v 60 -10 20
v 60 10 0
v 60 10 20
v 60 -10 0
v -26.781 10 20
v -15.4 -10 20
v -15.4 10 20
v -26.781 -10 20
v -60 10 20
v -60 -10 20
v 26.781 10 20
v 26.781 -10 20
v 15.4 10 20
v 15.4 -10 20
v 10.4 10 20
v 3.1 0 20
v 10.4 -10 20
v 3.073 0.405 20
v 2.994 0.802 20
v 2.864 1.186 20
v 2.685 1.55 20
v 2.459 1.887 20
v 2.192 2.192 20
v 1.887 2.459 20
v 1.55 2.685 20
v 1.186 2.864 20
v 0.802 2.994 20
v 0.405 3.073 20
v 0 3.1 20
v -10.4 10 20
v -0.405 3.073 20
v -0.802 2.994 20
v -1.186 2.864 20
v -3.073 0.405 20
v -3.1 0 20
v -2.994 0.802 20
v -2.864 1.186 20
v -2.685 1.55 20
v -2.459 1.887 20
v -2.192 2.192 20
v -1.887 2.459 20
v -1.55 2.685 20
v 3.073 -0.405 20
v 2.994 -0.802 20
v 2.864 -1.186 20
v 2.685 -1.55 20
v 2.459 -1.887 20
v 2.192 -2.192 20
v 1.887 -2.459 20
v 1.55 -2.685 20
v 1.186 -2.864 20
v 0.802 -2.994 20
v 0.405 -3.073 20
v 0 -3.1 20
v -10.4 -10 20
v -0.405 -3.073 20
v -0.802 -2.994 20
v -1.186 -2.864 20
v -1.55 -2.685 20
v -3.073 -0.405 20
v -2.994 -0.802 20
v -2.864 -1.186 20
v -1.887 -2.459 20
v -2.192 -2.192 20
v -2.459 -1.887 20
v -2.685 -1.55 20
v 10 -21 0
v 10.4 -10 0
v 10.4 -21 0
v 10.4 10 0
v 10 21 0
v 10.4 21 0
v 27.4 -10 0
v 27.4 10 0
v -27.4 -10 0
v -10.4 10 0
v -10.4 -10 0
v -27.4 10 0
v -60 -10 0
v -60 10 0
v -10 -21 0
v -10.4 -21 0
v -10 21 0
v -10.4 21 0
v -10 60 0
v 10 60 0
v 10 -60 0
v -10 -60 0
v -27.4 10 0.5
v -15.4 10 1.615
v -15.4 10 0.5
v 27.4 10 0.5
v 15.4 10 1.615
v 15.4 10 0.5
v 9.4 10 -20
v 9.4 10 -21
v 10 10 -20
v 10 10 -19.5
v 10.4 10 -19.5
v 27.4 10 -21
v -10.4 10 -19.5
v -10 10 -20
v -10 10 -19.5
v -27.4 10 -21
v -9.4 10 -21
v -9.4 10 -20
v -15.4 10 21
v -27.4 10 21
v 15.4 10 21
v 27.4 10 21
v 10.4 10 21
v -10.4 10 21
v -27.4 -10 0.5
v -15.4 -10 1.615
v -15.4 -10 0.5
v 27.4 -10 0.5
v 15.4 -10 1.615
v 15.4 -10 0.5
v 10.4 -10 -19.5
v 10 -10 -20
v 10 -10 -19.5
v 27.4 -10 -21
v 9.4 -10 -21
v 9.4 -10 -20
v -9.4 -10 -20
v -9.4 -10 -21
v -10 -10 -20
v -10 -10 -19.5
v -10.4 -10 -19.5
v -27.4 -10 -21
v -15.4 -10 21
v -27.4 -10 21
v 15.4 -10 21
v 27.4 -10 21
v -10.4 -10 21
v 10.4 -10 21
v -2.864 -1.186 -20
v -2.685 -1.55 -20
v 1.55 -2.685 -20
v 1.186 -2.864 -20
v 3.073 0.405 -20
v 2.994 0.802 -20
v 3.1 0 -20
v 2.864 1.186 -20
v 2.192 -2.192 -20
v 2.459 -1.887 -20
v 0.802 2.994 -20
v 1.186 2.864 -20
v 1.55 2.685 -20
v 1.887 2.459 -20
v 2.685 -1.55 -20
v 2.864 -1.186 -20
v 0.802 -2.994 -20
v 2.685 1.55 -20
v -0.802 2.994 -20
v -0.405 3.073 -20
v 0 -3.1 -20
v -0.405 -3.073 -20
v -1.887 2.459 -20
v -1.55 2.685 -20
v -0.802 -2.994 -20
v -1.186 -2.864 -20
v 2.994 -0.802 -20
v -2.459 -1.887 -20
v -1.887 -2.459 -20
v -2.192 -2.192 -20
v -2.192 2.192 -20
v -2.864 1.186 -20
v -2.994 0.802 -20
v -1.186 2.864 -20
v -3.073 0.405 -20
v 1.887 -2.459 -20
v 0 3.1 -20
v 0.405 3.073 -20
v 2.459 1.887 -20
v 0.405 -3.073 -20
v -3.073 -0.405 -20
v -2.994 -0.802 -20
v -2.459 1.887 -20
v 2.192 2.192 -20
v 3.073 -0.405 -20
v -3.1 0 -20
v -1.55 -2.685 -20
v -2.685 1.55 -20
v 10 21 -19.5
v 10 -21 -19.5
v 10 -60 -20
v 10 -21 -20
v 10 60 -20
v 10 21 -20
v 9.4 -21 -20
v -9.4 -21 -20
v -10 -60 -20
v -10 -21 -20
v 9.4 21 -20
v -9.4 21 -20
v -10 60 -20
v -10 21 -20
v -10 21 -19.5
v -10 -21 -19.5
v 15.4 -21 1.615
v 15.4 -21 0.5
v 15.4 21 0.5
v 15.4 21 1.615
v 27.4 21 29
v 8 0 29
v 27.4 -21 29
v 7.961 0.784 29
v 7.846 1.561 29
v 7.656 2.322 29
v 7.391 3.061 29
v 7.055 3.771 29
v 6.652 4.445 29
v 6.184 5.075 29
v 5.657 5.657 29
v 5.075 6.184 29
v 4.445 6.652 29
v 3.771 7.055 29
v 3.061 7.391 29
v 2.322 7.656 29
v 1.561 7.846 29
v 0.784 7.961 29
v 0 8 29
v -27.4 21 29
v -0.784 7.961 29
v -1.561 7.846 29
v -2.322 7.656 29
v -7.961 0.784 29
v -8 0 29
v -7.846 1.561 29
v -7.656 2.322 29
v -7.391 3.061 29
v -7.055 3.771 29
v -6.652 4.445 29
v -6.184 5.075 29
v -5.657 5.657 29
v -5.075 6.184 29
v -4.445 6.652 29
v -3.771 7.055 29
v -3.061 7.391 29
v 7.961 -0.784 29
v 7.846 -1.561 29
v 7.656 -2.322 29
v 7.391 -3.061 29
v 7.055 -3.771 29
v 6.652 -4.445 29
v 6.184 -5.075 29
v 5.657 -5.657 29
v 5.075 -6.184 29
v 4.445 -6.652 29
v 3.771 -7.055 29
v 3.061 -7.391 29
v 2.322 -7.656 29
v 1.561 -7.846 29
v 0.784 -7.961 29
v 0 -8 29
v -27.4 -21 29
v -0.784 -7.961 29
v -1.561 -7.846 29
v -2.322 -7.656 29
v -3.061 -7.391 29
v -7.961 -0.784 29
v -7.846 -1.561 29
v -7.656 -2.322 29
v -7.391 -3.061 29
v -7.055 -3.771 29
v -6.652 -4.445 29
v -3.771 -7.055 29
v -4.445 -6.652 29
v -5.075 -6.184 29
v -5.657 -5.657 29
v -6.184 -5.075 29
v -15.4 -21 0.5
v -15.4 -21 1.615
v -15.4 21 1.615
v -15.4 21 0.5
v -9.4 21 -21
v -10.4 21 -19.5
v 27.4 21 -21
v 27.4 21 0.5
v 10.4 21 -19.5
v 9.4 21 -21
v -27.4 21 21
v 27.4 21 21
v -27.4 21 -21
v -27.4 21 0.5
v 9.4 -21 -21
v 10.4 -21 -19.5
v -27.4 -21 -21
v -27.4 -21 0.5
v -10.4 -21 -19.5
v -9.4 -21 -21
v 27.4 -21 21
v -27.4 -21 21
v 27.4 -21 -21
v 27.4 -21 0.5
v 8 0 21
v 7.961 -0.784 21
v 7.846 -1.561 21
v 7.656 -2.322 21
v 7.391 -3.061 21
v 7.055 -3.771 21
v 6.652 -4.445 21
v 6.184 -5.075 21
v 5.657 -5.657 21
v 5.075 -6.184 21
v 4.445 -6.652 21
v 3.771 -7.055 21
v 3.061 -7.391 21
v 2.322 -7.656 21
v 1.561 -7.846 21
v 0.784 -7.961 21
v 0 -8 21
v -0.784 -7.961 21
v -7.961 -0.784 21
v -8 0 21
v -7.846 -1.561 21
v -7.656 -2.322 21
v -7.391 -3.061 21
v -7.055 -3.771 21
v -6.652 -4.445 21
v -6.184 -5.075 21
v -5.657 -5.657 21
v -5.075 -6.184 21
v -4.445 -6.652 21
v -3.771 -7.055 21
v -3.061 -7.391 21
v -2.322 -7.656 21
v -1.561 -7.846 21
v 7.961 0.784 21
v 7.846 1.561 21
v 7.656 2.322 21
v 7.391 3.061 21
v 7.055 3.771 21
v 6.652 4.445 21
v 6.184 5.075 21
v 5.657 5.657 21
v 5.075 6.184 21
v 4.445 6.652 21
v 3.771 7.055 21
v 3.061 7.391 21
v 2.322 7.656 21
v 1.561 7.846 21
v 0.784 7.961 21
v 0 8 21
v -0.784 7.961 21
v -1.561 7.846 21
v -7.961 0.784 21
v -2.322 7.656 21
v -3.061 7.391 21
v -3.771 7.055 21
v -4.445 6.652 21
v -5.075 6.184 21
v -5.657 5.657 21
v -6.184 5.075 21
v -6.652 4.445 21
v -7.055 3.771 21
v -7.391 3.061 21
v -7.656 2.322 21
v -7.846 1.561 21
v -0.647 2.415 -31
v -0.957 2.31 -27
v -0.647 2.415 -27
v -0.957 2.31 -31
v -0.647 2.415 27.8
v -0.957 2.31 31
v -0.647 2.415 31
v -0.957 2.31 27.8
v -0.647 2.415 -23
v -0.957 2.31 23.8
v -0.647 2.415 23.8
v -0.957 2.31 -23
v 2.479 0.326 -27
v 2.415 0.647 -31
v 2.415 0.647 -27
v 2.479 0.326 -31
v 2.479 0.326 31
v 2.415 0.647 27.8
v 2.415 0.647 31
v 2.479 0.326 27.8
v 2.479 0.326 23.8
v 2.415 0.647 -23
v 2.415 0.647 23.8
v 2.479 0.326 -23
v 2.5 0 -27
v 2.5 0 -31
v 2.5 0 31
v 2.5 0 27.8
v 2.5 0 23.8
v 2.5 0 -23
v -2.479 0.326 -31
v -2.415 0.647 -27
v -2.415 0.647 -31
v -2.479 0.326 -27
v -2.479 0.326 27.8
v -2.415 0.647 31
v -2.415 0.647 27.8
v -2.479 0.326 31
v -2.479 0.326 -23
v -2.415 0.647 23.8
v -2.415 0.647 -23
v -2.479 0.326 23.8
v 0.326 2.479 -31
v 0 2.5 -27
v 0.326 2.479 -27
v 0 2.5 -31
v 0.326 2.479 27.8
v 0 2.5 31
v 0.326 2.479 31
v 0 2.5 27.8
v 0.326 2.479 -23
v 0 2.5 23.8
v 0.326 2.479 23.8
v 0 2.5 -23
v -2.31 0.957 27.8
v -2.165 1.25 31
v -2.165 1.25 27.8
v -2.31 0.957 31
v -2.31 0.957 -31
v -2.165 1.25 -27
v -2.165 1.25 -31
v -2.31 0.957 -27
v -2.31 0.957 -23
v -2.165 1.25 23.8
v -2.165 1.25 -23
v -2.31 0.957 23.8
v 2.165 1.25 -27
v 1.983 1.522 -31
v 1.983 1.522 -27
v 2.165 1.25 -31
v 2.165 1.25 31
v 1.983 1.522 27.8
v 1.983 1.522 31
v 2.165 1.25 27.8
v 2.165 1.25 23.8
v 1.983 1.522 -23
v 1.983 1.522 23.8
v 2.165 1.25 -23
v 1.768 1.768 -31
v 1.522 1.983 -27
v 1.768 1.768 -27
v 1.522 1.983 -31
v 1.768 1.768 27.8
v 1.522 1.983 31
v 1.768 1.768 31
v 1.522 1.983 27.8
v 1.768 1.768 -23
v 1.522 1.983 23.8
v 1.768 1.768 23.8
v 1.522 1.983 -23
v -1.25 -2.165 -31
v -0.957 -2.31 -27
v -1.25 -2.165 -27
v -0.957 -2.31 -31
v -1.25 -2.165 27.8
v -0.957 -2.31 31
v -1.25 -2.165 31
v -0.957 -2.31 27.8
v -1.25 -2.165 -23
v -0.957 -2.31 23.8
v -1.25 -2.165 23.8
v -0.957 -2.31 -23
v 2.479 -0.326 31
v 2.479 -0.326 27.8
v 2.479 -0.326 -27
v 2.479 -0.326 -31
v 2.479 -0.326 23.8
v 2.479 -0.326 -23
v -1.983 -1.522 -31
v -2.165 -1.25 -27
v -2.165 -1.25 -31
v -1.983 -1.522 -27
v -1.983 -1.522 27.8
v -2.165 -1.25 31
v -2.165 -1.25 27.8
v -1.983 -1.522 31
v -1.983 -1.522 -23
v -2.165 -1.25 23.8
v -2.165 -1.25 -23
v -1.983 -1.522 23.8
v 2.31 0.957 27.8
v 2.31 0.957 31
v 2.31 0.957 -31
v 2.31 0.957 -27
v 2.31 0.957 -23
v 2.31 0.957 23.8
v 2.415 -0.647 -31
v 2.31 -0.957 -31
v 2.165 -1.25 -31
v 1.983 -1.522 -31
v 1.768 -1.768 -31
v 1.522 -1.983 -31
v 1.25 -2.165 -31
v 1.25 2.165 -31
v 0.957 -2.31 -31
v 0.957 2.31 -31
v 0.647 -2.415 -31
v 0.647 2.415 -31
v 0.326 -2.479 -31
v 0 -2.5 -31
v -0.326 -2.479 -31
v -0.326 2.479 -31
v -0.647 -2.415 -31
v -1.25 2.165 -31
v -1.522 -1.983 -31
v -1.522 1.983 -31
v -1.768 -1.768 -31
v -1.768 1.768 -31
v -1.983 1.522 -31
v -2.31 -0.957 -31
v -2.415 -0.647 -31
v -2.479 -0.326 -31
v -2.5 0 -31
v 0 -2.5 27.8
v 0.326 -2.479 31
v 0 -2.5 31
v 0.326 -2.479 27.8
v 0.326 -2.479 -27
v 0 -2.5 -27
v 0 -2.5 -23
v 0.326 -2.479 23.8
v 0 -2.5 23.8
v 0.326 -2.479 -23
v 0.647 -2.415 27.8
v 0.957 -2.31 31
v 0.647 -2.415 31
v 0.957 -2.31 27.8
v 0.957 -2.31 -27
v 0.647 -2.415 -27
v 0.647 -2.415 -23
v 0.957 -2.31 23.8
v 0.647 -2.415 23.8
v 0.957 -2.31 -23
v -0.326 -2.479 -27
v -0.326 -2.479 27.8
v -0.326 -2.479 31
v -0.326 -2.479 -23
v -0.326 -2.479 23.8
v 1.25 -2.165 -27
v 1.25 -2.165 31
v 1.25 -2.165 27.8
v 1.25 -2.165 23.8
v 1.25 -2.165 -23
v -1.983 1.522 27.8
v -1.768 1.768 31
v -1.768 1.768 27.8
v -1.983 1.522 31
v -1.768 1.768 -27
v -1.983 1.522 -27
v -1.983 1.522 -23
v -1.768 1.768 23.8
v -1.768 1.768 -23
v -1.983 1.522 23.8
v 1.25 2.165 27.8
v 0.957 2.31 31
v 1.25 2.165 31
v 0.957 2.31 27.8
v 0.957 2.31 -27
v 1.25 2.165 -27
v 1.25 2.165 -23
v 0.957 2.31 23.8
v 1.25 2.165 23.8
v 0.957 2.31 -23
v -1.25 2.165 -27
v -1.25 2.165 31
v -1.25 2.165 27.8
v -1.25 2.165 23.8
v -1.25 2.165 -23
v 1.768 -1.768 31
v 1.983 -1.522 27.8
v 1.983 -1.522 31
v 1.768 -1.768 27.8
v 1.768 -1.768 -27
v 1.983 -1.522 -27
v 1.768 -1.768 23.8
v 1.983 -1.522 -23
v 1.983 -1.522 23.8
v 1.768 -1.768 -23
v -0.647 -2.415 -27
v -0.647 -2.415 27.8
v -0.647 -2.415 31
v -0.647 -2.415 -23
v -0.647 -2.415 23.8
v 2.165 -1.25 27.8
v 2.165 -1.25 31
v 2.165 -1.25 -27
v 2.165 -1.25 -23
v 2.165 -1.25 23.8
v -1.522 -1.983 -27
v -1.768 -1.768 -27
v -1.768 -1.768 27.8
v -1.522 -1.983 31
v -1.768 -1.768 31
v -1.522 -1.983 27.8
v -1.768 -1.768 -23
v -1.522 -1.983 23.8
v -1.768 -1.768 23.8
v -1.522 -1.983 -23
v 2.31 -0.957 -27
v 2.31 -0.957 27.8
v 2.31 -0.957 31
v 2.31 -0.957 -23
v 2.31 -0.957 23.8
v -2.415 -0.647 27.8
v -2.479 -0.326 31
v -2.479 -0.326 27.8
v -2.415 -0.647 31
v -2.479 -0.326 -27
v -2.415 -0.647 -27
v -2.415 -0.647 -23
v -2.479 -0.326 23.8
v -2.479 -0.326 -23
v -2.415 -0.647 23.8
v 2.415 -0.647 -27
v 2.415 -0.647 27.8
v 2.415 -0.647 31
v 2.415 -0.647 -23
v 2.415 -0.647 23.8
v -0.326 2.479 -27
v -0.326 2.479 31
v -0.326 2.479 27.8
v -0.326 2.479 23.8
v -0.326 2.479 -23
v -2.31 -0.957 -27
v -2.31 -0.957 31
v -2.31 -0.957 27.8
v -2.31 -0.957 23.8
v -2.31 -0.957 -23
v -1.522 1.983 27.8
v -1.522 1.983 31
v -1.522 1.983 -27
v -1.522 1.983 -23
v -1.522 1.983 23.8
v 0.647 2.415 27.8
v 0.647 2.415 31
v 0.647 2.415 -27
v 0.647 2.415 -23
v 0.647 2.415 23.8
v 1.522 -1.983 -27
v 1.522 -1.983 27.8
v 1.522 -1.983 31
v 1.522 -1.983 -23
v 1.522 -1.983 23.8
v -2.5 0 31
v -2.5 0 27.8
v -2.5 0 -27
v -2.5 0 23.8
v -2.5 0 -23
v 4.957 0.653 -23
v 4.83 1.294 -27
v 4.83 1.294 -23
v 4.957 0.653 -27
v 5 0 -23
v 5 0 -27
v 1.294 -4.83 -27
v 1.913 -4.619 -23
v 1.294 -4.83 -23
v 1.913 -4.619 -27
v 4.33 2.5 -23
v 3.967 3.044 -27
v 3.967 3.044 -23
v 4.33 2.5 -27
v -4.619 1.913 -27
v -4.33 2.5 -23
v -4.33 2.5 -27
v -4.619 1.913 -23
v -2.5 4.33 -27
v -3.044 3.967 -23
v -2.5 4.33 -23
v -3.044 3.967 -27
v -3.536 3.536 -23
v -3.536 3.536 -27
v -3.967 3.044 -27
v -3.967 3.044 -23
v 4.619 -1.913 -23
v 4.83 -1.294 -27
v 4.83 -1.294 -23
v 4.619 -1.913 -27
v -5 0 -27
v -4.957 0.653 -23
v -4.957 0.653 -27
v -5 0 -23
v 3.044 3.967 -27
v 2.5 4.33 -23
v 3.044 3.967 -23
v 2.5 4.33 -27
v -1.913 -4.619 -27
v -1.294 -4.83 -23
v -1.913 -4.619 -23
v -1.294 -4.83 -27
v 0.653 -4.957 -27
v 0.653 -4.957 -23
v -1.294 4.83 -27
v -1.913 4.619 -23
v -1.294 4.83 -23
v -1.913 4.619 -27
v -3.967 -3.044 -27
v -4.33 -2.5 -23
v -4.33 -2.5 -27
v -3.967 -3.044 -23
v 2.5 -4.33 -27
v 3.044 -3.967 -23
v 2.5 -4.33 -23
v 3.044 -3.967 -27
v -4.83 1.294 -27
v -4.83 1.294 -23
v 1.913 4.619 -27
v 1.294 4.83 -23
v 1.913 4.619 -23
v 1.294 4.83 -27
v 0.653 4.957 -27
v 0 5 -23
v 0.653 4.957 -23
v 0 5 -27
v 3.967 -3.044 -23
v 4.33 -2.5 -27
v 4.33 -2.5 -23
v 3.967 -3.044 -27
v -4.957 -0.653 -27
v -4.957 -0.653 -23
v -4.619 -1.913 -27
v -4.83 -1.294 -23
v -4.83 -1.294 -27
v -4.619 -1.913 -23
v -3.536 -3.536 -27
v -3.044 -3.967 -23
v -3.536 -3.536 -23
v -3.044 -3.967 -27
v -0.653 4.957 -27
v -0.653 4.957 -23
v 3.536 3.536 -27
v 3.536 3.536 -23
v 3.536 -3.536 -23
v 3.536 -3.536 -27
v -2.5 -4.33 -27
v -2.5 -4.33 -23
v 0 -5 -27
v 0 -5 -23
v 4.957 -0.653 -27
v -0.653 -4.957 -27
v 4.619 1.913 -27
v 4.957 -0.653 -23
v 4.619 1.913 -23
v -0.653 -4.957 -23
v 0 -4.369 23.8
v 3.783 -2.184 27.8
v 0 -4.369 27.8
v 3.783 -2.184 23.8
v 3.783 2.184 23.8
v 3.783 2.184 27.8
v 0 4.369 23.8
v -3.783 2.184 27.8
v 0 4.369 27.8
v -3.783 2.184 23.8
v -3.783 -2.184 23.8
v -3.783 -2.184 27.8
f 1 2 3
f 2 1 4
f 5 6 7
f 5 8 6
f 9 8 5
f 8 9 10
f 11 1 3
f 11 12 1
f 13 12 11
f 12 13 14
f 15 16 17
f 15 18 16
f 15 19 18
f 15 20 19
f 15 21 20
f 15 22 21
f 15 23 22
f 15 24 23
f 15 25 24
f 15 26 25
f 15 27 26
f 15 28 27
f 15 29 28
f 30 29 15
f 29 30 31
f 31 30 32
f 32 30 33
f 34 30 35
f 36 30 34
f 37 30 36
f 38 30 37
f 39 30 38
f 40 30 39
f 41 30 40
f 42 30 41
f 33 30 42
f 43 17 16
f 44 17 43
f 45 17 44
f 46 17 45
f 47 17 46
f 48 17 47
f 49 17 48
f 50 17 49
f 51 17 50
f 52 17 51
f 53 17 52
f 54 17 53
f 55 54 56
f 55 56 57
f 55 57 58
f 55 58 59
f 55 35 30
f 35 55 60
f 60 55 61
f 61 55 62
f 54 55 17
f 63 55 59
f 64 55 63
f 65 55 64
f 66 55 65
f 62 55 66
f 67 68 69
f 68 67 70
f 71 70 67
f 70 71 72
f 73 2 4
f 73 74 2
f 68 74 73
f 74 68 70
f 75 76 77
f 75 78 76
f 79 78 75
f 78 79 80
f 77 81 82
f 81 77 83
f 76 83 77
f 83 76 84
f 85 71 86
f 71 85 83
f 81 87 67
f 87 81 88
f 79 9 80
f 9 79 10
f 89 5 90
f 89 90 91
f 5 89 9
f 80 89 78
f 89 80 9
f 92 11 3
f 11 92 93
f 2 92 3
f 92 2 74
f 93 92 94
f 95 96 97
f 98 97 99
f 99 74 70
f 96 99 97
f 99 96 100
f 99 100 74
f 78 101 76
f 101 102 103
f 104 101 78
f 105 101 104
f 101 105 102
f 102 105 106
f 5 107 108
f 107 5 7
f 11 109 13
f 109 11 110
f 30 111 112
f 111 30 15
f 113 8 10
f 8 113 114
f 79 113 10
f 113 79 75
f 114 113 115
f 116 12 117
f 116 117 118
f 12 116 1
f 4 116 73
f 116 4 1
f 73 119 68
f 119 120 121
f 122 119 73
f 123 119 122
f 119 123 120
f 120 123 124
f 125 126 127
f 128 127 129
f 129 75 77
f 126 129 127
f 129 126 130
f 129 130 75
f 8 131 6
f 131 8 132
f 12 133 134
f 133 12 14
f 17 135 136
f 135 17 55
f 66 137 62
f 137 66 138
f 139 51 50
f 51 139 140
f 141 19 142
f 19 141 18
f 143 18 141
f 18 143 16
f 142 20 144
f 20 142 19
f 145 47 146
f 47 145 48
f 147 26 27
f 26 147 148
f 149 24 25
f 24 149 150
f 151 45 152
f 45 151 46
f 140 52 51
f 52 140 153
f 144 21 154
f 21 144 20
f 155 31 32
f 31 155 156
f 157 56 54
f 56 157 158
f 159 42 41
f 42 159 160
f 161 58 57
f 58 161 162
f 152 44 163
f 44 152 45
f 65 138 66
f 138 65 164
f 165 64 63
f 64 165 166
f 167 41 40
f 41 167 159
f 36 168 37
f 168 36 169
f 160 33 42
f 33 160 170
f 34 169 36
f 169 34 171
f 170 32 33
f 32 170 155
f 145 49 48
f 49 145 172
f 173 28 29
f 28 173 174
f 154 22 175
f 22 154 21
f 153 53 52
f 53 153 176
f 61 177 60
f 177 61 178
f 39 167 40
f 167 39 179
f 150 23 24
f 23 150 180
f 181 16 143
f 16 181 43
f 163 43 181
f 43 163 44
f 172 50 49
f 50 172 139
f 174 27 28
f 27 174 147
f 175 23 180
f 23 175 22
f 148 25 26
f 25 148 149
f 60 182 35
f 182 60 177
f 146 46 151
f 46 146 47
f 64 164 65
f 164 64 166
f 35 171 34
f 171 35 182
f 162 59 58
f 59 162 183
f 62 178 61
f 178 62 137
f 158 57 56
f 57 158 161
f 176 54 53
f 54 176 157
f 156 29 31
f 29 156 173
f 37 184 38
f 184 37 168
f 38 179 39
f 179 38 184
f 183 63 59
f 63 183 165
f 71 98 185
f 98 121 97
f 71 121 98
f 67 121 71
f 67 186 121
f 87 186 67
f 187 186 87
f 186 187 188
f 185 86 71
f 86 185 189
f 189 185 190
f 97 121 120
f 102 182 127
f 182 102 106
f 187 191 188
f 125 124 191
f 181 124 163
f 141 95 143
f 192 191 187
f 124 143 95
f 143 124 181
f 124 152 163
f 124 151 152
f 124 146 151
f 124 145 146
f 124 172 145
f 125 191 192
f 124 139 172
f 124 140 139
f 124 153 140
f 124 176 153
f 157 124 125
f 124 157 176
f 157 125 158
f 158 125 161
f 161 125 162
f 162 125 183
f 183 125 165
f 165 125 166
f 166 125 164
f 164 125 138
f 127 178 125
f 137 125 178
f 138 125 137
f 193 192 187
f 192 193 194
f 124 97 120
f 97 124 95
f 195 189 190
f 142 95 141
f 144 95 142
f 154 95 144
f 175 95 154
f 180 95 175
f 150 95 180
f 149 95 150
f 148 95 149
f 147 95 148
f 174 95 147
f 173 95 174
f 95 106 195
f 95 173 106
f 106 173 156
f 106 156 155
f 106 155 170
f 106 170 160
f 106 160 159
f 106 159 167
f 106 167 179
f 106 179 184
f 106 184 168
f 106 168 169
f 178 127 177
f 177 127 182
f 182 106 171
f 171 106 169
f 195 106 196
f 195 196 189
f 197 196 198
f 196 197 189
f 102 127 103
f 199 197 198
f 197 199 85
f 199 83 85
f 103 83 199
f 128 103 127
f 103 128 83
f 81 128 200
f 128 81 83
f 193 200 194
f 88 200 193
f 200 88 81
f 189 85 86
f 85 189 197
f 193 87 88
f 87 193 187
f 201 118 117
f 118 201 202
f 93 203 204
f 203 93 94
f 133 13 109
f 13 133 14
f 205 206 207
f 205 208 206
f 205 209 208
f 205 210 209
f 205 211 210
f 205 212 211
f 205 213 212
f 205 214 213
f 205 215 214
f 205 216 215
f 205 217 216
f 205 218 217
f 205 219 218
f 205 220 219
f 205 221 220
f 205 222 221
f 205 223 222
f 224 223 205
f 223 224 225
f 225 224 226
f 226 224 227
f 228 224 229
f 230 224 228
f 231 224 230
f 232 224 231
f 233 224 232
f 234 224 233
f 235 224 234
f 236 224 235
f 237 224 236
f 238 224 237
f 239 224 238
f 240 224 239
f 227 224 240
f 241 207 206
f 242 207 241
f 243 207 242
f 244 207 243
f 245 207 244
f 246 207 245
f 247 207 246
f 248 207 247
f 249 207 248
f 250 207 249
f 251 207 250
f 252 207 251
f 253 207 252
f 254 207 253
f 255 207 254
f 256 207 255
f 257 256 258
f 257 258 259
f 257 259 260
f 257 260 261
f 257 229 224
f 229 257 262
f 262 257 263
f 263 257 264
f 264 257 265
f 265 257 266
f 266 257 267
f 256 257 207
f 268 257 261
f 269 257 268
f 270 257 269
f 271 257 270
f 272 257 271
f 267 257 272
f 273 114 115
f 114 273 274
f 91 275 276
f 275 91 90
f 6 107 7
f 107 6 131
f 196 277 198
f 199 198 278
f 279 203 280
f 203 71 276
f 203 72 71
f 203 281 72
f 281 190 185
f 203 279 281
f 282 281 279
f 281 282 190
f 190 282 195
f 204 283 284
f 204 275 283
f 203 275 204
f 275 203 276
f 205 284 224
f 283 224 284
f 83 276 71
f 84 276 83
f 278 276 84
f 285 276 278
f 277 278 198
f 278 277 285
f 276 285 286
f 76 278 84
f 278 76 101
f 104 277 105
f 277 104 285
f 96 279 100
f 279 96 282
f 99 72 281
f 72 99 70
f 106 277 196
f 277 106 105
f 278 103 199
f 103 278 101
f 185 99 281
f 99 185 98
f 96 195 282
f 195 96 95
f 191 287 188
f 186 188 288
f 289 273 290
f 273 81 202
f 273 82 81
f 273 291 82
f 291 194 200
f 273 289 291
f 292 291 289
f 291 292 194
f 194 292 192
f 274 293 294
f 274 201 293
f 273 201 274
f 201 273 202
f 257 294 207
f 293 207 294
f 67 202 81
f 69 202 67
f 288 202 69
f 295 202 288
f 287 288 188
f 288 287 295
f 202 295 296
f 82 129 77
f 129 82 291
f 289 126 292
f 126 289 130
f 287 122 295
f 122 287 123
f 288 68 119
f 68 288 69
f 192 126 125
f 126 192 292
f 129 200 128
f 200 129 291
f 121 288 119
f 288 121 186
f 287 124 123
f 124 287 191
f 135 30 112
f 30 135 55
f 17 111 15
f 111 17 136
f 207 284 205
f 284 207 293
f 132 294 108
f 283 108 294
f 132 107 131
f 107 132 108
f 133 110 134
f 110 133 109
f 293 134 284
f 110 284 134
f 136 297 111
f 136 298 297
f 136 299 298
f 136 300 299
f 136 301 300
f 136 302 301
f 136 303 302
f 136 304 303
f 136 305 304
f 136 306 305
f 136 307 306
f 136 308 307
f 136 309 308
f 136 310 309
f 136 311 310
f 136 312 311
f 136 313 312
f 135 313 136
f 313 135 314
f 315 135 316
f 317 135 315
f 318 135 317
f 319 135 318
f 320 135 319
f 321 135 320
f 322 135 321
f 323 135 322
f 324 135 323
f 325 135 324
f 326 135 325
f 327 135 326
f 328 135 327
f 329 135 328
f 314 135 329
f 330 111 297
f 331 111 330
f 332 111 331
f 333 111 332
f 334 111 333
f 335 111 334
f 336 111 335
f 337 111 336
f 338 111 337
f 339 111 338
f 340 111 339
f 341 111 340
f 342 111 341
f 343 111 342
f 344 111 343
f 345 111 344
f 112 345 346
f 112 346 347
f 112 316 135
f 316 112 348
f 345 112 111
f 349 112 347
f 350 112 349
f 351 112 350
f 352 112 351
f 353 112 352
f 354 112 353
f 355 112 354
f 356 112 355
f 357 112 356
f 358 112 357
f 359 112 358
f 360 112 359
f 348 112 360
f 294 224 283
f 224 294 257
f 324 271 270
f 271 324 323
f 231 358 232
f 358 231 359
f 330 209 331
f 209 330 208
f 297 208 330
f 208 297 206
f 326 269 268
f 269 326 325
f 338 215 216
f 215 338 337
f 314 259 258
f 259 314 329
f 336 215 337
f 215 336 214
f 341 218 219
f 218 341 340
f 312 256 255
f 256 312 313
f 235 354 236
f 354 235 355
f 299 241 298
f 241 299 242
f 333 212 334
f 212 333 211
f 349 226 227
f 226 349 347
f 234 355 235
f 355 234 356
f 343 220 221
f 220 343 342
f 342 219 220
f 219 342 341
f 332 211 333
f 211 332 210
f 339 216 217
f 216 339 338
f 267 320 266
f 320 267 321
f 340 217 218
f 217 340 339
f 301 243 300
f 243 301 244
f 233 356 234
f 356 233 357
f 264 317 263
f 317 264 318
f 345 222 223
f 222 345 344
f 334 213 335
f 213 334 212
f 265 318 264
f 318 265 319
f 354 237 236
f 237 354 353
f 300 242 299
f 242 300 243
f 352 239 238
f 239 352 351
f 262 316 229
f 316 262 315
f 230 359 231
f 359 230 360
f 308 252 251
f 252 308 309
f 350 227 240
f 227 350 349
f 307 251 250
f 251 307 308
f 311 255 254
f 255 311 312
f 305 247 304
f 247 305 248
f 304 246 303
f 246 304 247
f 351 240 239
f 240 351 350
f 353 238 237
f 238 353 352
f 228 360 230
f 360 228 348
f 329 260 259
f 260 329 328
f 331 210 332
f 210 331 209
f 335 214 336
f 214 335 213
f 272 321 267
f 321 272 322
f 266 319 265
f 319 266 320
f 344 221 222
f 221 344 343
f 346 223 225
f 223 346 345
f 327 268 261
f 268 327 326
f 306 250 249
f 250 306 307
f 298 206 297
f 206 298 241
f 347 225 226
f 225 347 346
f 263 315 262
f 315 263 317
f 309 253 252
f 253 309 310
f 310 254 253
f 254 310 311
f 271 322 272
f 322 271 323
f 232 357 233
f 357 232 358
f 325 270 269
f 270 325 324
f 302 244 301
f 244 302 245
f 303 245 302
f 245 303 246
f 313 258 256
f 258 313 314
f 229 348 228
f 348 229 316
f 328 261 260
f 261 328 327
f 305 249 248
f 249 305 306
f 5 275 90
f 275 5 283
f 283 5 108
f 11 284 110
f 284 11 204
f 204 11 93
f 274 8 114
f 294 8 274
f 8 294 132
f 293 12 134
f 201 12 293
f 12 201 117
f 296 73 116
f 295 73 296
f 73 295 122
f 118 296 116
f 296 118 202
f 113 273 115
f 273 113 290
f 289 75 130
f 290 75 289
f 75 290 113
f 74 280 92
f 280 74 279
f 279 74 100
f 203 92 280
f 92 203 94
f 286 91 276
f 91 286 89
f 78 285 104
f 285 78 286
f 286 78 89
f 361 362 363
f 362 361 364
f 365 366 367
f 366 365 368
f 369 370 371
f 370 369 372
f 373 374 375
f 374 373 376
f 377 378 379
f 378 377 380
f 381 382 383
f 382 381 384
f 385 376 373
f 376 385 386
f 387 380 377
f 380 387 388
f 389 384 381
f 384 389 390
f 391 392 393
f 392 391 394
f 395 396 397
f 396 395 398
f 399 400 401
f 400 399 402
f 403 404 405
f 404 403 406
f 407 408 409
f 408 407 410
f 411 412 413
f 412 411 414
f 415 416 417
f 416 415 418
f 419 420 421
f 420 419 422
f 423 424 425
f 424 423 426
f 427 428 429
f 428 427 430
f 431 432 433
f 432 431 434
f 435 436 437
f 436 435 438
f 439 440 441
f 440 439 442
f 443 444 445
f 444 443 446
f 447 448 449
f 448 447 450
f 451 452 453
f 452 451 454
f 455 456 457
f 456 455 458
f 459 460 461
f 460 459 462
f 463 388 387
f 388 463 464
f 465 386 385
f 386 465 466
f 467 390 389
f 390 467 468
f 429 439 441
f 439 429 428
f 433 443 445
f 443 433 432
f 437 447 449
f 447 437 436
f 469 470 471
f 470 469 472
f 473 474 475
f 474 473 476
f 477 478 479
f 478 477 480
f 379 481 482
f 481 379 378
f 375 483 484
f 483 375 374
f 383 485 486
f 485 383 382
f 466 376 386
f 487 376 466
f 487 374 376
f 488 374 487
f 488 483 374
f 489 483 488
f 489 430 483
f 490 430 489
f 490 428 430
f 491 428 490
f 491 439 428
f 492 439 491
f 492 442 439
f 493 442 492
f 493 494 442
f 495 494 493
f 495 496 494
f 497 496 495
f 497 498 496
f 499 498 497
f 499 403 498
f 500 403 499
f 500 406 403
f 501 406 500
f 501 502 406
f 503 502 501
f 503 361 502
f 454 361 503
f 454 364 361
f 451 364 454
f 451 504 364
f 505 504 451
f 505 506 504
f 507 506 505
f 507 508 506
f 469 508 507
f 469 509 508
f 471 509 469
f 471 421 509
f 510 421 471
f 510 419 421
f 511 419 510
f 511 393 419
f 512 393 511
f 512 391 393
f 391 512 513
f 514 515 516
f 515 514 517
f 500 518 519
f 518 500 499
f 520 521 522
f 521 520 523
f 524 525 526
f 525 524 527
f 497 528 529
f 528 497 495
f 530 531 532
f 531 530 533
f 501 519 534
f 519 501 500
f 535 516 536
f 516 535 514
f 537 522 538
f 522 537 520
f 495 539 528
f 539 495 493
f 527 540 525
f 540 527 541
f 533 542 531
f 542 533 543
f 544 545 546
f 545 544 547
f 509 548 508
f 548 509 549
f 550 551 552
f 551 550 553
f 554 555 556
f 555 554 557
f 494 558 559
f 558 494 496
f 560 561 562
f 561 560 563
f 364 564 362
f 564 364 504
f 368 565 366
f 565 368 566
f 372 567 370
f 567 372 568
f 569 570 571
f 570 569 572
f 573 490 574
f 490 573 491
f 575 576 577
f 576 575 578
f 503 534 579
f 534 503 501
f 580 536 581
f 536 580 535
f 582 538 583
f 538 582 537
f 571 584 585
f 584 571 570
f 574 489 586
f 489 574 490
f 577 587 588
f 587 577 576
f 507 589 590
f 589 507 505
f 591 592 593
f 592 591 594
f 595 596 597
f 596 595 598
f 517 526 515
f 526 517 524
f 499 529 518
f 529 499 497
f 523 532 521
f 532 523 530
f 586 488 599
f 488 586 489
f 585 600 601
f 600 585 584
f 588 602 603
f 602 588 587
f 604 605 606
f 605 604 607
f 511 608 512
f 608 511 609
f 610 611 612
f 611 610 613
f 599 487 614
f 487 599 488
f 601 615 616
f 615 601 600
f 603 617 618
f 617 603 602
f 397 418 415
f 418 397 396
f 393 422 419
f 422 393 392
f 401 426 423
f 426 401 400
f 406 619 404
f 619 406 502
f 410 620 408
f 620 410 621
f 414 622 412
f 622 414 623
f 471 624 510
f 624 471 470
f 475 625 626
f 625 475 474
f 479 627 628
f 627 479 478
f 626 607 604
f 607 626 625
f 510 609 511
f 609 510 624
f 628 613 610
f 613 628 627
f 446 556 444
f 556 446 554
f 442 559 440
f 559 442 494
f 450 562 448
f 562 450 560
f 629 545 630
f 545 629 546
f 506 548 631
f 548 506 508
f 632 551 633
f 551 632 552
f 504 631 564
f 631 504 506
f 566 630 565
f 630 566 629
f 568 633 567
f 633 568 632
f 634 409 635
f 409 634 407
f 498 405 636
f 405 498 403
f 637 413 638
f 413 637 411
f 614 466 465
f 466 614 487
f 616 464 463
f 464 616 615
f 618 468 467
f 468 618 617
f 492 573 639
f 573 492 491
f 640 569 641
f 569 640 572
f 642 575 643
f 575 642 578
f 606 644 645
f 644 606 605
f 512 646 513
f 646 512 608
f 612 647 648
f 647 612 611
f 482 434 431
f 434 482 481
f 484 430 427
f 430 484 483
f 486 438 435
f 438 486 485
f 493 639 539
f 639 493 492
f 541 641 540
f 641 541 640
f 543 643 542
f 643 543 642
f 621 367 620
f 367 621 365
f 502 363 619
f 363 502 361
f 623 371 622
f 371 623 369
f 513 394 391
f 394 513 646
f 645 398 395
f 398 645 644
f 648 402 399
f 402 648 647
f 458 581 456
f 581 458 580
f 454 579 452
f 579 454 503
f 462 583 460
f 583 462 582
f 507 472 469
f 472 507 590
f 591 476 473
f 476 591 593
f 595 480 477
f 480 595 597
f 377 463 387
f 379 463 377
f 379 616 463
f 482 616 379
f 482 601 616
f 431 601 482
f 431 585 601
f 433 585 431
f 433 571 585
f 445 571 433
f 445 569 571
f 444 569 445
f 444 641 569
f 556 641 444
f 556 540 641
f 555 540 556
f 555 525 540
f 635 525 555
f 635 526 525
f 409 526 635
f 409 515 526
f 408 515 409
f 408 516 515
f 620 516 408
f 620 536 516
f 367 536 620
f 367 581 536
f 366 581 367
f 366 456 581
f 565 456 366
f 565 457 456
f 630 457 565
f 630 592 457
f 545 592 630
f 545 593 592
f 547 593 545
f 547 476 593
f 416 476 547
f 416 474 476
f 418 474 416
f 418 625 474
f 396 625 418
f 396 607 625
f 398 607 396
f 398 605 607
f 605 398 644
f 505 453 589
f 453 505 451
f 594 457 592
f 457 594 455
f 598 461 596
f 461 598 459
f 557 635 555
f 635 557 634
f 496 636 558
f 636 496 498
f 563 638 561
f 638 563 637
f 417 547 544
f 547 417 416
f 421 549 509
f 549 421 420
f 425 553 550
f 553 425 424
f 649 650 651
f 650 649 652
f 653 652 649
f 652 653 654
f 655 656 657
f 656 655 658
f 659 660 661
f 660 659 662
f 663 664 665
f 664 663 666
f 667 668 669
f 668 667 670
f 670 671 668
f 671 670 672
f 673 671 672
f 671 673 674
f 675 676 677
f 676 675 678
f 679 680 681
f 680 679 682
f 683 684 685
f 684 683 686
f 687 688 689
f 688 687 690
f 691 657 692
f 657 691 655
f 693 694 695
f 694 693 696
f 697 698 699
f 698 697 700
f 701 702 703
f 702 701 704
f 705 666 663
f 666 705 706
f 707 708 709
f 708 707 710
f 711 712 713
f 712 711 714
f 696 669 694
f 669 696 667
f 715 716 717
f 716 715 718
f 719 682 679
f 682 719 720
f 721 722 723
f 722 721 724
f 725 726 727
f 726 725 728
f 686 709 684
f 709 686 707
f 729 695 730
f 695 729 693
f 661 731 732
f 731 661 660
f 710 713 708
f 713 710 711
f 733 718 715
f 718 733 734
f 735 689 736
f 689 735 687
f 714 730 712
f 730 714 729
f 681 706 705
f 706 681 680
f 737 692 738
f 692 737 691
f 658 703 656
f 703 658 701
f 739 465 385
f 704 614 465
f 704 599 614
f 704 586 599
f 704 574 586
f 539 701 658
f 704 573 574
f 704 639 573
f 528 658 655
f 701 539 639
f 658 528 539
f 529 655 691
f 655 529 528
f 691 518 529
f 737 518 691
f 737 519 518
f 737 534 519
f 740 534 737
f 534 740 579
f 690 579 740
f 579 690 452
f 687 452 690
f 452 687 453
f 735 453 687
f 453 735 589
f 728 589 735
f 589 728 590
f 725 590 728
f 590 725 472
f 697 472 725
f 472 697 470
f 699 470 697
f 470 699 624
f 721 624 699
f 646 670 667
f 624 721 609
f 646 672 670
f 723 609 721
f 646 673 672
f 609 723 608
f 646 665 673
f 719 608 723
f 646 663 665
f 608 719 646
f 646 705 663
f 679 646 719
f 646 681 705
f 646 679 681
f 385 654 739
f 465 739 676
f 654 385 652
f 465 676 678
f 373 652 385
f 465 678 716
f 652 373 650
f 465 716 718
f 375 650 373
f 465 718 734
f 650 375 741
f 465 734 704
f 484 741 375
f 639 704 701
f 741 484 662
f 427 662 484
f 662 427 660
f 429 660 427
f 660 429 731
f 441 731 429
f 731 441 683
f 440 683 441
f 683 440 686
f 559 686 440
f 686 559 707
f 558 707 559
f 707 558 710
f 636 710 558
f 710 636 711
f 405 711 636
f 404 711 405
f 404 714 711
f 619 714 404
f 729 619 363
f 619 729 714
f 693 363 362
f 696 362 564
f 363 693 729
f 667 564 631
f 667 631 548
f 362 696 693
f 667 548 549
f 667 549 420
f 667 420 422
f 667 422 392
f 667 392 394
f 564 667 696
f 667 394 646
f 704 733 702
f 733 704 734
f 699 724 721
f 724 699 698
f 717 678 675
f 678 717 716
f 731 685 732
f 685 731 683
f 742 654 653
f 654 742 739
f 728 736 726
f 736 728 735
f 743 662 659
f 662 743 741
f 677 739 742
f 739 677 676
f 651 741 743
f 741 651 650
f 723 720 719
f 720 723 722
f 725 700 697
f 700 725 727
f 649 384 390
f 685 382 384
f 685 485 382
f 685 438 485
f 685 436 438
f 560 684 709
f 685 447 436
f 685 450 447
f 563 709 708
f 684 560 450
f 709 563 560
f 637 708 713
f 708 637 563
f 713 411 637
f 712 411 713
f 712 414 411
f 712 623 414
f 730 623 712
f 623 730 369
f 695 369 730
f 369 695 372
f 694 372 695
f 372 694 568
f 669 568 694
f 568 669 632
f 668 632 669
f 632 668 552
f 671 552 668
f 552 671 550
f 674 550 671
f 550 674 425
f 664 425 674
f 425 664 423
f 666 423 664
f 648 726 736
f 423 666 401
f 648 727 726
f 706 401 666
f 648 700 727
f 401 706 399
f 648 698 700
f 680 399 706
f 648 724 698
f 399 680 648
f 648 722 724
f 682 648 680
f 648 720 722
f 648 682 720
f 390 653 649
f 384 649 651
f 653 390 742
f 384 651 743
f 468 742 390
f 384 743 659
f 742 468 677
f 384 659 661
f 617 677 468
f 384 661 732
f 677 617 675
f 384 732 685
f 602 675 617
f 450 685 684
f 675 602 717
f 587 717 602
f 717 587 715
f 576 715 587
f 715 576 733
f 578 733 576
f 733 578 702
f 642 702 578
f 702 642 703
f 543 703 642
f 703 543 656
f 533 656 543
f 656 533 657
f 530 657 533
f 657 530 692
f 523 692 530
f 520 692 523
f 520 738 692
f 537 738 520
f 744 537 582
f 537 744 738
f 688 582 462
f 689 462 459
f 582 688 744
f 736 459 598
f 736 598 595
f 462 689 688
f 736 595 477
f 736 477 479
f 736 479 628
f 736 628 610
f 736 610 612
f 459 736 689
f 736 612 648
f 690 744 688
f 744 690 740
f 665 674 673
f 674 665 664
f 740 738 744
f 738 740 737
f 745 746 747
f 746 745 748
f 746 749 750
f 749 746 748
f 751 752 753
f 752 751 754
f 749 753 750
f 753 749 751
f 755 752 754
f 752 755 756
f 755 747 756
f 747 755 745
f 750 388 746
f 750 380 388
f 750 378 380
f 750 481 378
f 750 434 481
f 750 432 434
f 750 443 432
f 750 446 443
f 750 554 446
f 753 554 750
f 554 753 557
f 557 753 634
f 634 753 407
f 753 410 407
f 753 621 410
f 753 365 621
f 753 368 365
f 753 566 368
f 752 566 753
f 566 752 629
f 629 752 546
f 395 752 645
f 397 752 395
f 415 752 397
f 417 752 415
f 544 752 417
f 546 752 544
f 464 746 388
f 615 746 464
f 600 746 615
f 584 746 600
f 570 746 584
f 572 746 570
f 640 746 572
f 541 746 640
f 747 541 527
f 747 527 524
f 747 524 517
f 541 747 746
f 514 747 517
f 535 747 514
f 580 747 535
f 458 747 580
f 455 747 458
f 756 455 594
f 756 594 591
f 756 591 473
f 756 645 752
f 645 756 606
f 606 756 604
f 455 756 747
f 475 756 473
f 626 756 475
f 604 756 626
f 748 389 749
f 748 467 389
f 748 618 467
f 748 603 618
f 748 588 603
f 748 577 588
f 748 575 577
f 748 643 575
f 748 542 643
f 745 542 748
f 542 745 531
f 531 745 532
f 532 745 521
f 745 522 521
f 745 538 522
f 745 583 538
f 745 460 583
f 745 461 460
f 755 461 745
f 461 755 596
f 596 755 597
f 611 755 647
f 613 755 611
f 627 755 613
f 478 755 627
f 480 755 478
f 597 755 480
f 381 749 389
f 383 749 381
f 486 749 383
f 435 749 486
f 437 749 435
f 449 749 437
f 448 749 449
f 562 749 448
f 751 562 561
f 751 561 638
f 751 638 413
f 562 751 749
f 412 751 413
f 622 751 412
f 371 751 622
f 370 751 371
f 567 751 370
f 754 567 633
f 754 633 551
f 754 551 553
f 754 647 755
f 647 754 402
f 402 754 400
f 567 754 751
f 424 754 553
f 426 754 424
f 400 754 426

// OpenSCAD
// file: ../perpendicular-u-joint-guard-v1.4-full-nut-passage/full_nut_passage_guard.scad
// v1.4: keep the exact v1.3 body; remove the nut-pocket floor with one
// full-depth Ø16 cylindrical subtraction. Units: mm; Z positive upwards.
// Imported v1.3 geometry contains all four triangles and the lower hooks.
use <../perpendicular-u-joint-guard-v1.3-triangular-corner-fills/candidate_triangular_corner_fills.scad>;

$fn = 48;
PART = "clip";
nut_passage_d = 16.0;

module full_depth_nut_passage() {
    // Cutter extends z=-31..39, past the whole printed z=-21..29 envelope.
    // 64 facets match the existing Ø16 pocket, avoiding a stepped profile.
    translate([0, 0, 4])
        cylinder(d = nut_passage_d, h = 70, center = true, $fn = 64);
}

module guard_v1_4() {
    difference() {
        candidate_print_solid();
        full_depth_nut_passage();
    }
}

guard_v1_4();
// file: ../perpendicular-u-joint-guard-v1.3-triangular-corner-fills/candidate_triangular_corner_fills.scad
// Candidate v1.3: four triangular concave-corner fill blocks.
//
// Base: accepted v0.7 eaves12 geometry. v0.9/v1.0/v1.1/v1.2 are not
// imported. Each corner block is a real triangular prism: broad at the roof,
// tapering continuously toward z=0, and overlapping the U side wall.

use <../perpendicular-u-joint-guard-v0.7/perpendicular_double_u_guard.scad>;

$fn = 48;
PART = "candidate_iso";

// Explicit v0.7 interface values.
roof_x_outer = 27.4;       // accepted eaves12 roof: -27.4..+27.4
side_wall_x_outer = 15.4;  // existing side-wall outer edge
blue_tube_x_outer = 10.0;  // blue lower 20x20 tube half-width
plate_y_inner = 10.0;
plate_y_outer = 21.0;
plate_depth_y = plate_y_outer - plate_y_inner; // 11 mm per front/back U plate

// The top edge is 0.5 mm inside the roof volume (roof underside z=21), and
// the lower point enters the side wall by 1 mm in X.  The XZ area therefore
// has positive overlap at both ends, not edge-only contact.
triangle_top_z = 21.5;
triangle_bottom_z = 0.0;
triangle_roof_overlap_z = triangle_top_z - 21.0;
triangle_side_overlap_x = 1.0;
triangle_inner_x = side_wall_x_outer - triangle_side_overlap_x; // 14.4

// Bottom retaining-hook contract copied from v0.7 for explicit verification.
hook_height_z = 1.5;
u_bottom_z = -21.0;
hook_top_z = u_bottom_z + hook_height_z; // -19.5

assert(plate_depth_y == 11, "每个三角块的前后板深必须是 11 mm");
assert(triangle_top_z > 21 && triangle_bottom_z == 0,
       "三角块上端必须搭入屋檐、下端落到 z=0");
assert(triangle_inner_x > blue_tube_x_outer,
       "三角块下端不得进入蓝色方管 x=-10..+10 包络");
assert(triangle_side_overlap_x > 0 && triangle_roof_overlap_z > 0,
       "三角块必须与屋檐和侧墙都有正重叠");
assert(hook_height_z == 1.5 && u_bottom_z == -21 && hook_top_z == -19.5,
       "底部卡脚必须保持 z=-21..-19.5");

// A polygon in XZ is extruded only through the corresponding front/back U
// plate. The center y=-10..+10 passage remains open.
module triangular_fill_xz(points, yc) {
    translate([0, yc, 0])
        rotate([90, 0, 0])
            linear_extrude(height = plate_depth_y,
                           center = true,
                           convexity = 10)
                polygon(points = points);
}

module front_neg_x_triangle() {
    // -X roof end -> +X inward. Top wide, lower point at the side wall.
    triangular_fill_xz([
        [-roof_x_outer, 21.0],
        [-triangle_inner_x, triangle_top_z],
        [-triangle_inner_x, triangle_bottom_z]
    ], (plate_y_inner + plate_y_outer) / 2);
}

module front_pos_x_triangle() {
    // +X roof end -> -X inward. Mirrored triangle.
    triangular_fill_xz([
        [roof_x_outer, 21.0],
        [triangle_inner_x, triangle_top_z],
        [triangle_inner_x, triangle_bottom_z]
    ], (plate_y_inner + plate_y_outer) / 2);
}

module back_neg_x_triangle() {
    triangular_fill_xz([
        [-roof_x_outer, 21.0],
        [-triangle_inner_x, triangle_top_z],
        [-triangle_inner_x, triangle_bottom_z]
    ], -(plate_y_inner + plate_y_outer) / 2);
}

module back_pos_x_triangle() {
    triangular_fill_xz([
        [roof_x_outer, 21.0],
        [triangle_inner_x, triangle_top_z],
        [triangle_inner_x, triangle_bottom_z]
    ], -(plate_y_inner + plate_y_outer) / 2);
}

module front_two_triangular_fills() {
    union() {
        front_neg_x_triangle();
        front_pos_x_triangle();
    }
}

module back_two_triangular_fills() {
    union() {
        back_neg_x_triangle();
        back_pos_x_triangle();
    }
}

module all_four_triangular_fills() {
    union() {
        front_two_triangular_fills();
        back_two_triangular_fills();
    }
}

module candidate_print_solid() {
    // Final hole operation is deliberately after the complete four-block
    // union; this preserves a true Z through-hole and the round nut pocket.
    difference() {
        union() {
            double_u_clip();
            all_four_triangular_fills();
        }
        vertical_screw_relief();
    }
}

module candidate_clip() {
    candidate_print_solid();
}

module candidate_assembly_iso() {
    upper_long_tube();
    lower_cross_tube();
    color([0.96, 0.39, 0.08]) double_u_clip();
    color([0.86, 0.13, 0.08]) front_two_triangular_fills();
    color([0.62, 0.12, 0.52]) back_two_triangular_fills();
    vertical_joint_screw();
}

module candidate_front_xz() {
    lower_cross_tube();
    color([0.96, 0.39, 0.08]) double_u_clip();
    color([0.86, 0.13, 0.08]) front_two_triangular_fills();
    vertical_joint_screw();
}

module candidate_back_xz() {
    lower_cross_tube();
    color([0.96, 0.39, 0.08]) double_u_clip();
    color([0.62, 0.12, 0.52]) back_two_triangular_fills();
    vertical_joint_screw();
}

module candidate_top_slice() {
    // At z=-0.5..2.5 the four blocks show their two front/back 11 mm bands;
    // the blue tube and the central y gap remain visible.
    slice_box = 200;
    color([0.28, 0.45, 0.78])
        intersection() {
            lower_cross_tube();
            translate([-slice_box / 2, -slice_box / 2, -0.5])
                cube([slice_box, slice_box, 3.0]);
        }
    color([0.96, 0.39, 0.08])
        intersection() {
            double_u_clip();
            translate([-slice_box / 2, -slice_box / 2, -0.5])
                cube([slice_box, slice_box, 3.0]);
        }
    color([0.86, 0.13, 0.08])
        intersection() {
            front_two_triangular_fills();
            translate([-slice_box / 2, -slice_box / 2, -0.5])
                cube([slice_box, slice_box, 3.0]);
        }
    color([0.62, 0.12, 0.52])
        intersection() {
            back_two_triangular_fills();
            translate([-slice_box / 2, -slice_box / 2, -0.5])
                cube([slice_box, slice_box, 3.0]);
        }
}

module candidate_hole_section() {
    // Center y=0 section: the bore and round nut pocket are shown without
    // confusing them with the bottom hook, which is outside this section.
    intersection() {
        candidate_print_solid();
        translate([-100, -0.4, -100]) cube([200, 0.8, 200]);
    }
}

module candidate_hook_check() {
    // Isolated lower detail: exact imported v0.7 U plate and blue tube, with
    // hook volumes highlighted only for review. This is not the print union.
    detail_box = 200;
    detail_z0 = -22;
    detail_h = 5;
    detail_y0 = 8;
    detail_ydepth = 15;
    intersection() {
        lower_cross_tube();
        translate([-detail_box / 2, detail_y0, detail_z0])
            cube([detail_box, detail_ydepth, detail_h]);
    }
    color([0.96, 0.39, 0.08])
        intersection() {
            u_plate(plate_y_inner, plate_y_outer);
            translate([-detail_box / 2, detail_y0, detail_z0])
                cube([detail_box, detail_ydepth, detail_h]);
        }
    color([0.20, 0.78, 0.20])
        intersection() {
            union() {
                translate([-13.65, 15.5, -20.25])
                    cube([3.5, 11, 1.5], center = true);
                translate([13.65, 15.5, -20.25])
                    cube([3.5, 11, 1.5], center = true);
            }
            translate([-detail_box / 2, detail_y0, detail_z0])
                cube([detail_box, detail_ydepth, detail_h]);
        }
}

if (PART == "candidate_clip") {
    candidate_clip();
} else if (PART == "candidate_front_xz") {
    candidate_front_xz();
} else if (PART == "candidate_back_xz") {
    candidate_back_xz();
} else if (PART == "candidate_top_slice") {
    candidate_top_slice();
} else if (PART == "candidate_hole_section") {
    candidate_hole_section();
} else if (PART == "candidate_hook_check") {
    candidate_hook_check();
} else {
    candidate_assembly_iso();
}
// file: ../perpendicular-u-joint-guard-v1.5-vertical-tube-clearance/vertical_tube_clearance_guard.scad
// v1.5: v1.4 Ø16 full nut passage + minimum downward-entry upper-tube slot.
// Units mm. X: upper long tube; Y: blue foot/front-back; Z: up.
use <../perpendicular-u-joint-guard-v1.4-full-nut-passage/full_nut_passage_guard.scad>;

$fn = 48;

module upper_pipe_vertical_entry_slot() {
    // Fixed gray upper tube: x=-60..60, y=-10..10, z=0..20.
    // While the clip moves down, that tube sweeps upward in clip coordinates.
    // A bottom-open slot ending at z=20 covers its whole relevant sweep in
    // the printed z=-21..29 envelope. Roof underside remains at z=21.
    // Preserve exact 20 mm Y width rather than silently adding fit clearance.
    translate([-60, -10, -31]) cube([120, 20, 51]);
}

module guard_v1_5() {
    difference() {
        guard_v1_4();
        upper_pipe_vertical_entry_slot();
    }
}

guard_v1_5();
// file: lower_x_extension_guard.scad
// v1.6 X-extension candidate, mm. Keep v1.5 geometry; add lower outer blocks.
// X ends ±15.4 -> ±27.4, 12 mm per side. Y stays [-21,-10] / [10,21].
// Existing lower tube z=-20..0; original snap hook z=-21..-19.5.
// Their union spans 21 mm due to 0.5 mm intentional overlap. To honor the
// spoken 21.5 mm added-block height without moving existing features, anchor
// at the original printed bottom -21 and end the new blocks at z=+0.5.
use <../perpendicular-u-joint-guard-v1.5-vertical-tube-clearance/vertical_tube_clearance_guard.scad>;
use <../perpendicular-u-joint-guard-v1.4-full-nut-passage/full_nut_passage_guard.scad>;

$fn = 48;
x_outward_extension = 12;
original_outer_x = 15.4;
extension_bottom_z = -21;
extension_height_z = 21.5;
extension_top_z = extension_bottom_z + extension_height_z; // +0.5
extension_overlap_x = 0.1;

module lower_x_extensions() {
    // Four outer blocks join the existing four lower U arms with positive
    // 0.1 mm X overlap. No translations/scales of any original feature.
    for (y0 = [-21,10]) {
        translate([original_outer_x-extension_overlap_x, y0, extension_bottom_z])
            cube([x_outward_extension+extension_overlap_x, 11, extension_height_z]);
        translate([-original_outer_x-x_outward_extension, y0, extension_bottom_z])
            cube([x_outward_extension+extension_overlap_x, 11, extension_height_z]);
    }
}

module guard_v1_6_x() {
    difference() {
        union() { guard_v1_5(); lower_x_extensions(); }
        full_depth_nut_passage();
        upper_pipe_vertical_entry_slot();
    }
}

guard_v1_6_x();
// main file
// v1.6 X-extension: real model sections and dimensions. No raster invention.
use <lower_x_extension_guard.scad>;
use <../perpendicular-u-joint-guard-v1.5-vertical-tube-clearance/vertical_tube_clearance_guard.scad>;
use <../perpendicular-u-joint-guard-v1.3-triangular-corner-fills/candidate_triangular_corner_fills.scad>;
use <../perpendicular-u-joint-guard-v0.7/perpendicular_double_u_guard.scad>;
$fn=48;
VIEW="assembly";

module added() { difference() { guard_v1_6_x(); guard_v1_5(); } }
module colored_part() {
    color([0.96,0.39,0.08]) guard_v1_5();
    color([0.16,0.65,0.33]) added();
}
module assembly() {
    upper_long_tube(); lower_cross_tube(); colored_part(); vertical_joint_screw();
}
module xz_slice(y=15.5) {
    intersection() {
        children();
        translate([-65,y-0.025,-28]) cube([130,0.05,65]);
    }
}
module label_xz(value,x,z,size=3,c=[0.1,0.12,0.15]) {
    color(c) translate([x,-2,z]) rotate([90,0,0])
        linear_extrude(height=0.1)
            text(value,font="Arial Unicode MS",size=size,valign="center");
}
module line_xz(a,b,c=[0.16,0.2,0.23]) {
    color(c) hull() {
        translate([a[0],-1,a[1]]) sphere(d=0.22,$fn=12);
        translate([b[0],-1,b[1]]) sphere(d=0.22,$fn=12);
    }
}
module dim_x(a,b,z,caption) {
    line_xz([a,z],[b,z]);
    line_xz([a,z-1],[a,z+1]); line_xz([b,z-1],[b,z+1]);
    label_xz(caption,(a+b)/2-4.5,z-3,2.6);
}
module xz_dimensions(candidate=true,title=true) {
    color([0.96,0.39,0.08]) xz_slice() guard_v1_5();
    if(candidate) color([0.16,0.65,0.33]) xz_slice() added();
    color([0.28,0.45,0.78]) xz_slice() lower_cross_tube();
    if(title) {
        label_xz("v1.6 X 向下部延伸 / Y=15.5 剖面",-44,44,3.6);
        label_xz("绿色为新增打印材料；管子、原卡扣不移动",-44,37,2.9);
    }
    if(candidate) {
        dim_x(-27.4,-15.4,-28,"12 mm");
        dim_x(15.4,27.4,-28,"12 mm");
        line_xz([33,-21],[33,0.5]);
        line_xz([32,-21],[34,-21]); line_xz([32,0.5],[34,0.5]);
        label_xz("21.5 mm",37,-10,3);
        label_xz("Z=+0.5",37,0.5,2.8);
        label_xz("Z=-21",37,-21,2.8);
    }
    label_xz("-X",-27,-38,2.8); label_xz("+X",20,-38,2.8);
}
module comparison() {
    translate([-68,0,0]) {
        xz_dimensions(false,false);
        label_xz("基线 v1.5",-24,39,4);
        dim_x(-15.4,15.4,-28,"下部外宽 30.8");
    }
    translate([68,0,0]) {
        xz_dimensions(true,false);
        label_xz("候选 v1.6：X±12",-28,39,4);
    }
}
module yz_end_slice() {
    // New end material at x=20: both bands visible, center 20 mm is open.
    color([0.16,0.65,0.33]) intersection() {
        added(); translate([19.975,-40,-25]) cube([0.05,80,60]);
    }
    color([0.96,0.39,0.08]) intersection() {
        guard_v1_5(); translate([19.975,-40,-25]) cube([0.05,80,60]);
    }
    module label(value,y,z,size=3) {
        color([0.1,0.12,0.15]) translate([22,y,z]) rotate([90,0,90])
            linear_extrude(height=0.1)
                text(value,font="Arial Unicode MS",size=size,valign="center");
    }
    label("X=20 端部剖面：Y 尺寸保持原值",-32,39,3.4);
    label("Y=-21..-10",-33,-30,2.6);
    label("Y=+10..+21",5,-30,2.6);
    label("中央 -10..+10 保持 20 mm；灰管通路敞开",-32,-37,2.6);
    label("延伸块 Z=-21..+0.5，共 21.5 mm",-32,33,2.9);
}
module top_lower_slice() {
    color([0.96,0.39,0.08]) intersection() {
        guard_v1_5(); translate([-40,-40,-10.1]) cube([80,80,0.2]);
    }
    color([0.16,0.65,0.33]) intersection() {
        added(); translate([-40,-40,-10.1]) cube([80,80,0.2]);
    }
    color([0.28,0.45,0.78]) intersection() {
        lower_cross_tube(); translate([-40,-55,-10.1]) cube([80,110,0.2]);
    }
    for(entry=[
        ["v1.6 下部俯视：X 左右各 +12 mm；Y 不变",-48,40,3.2],
        ["X=-27.4",-44,26,2.8],["X=+27.4",15,26,2.8],
        ["Y 外宽 42 mm / 中央通道 20 mm",-38,-37,3.0]
    ]) color([0.1,0.12,0.15]) translate([entry[1],entry[2],-8])
        linear_extrude(height=0.1)
            text(entry[0],font="Arial Unicode MS",size=entry[3],valign="center");
}
module allowed_hooks() {
    for(yc=[-15.5,15.5]) for(xc=[-11.15,11.15])
        translate([xc,yc,-20.25]) cube([3.5,11,1.5],center=true);
}

if(VIEW=="assembly") assembly();
else if(VIEW=="xz") xz_dimensions();
else if(VIEW=="comparison") comparison();
else if(VIEW=="end") yz_end_slice();
else if(VIEW=="top") top_lower_slice();
else if(VIEW=="clip") guard_v1_6_x();
else if(VIEW=="passage_obstruction") {
    intersection() {
        guard_v1_6_x();
        translate([0,0,4]) cylinder(d=15.999,h=70,center=true,$fn=64);
    }
} else if(VIEW=="upper_motion_obstruction") {
    intersection() {
        guard_v1_6_x();
        hull() { upper_long_tube(); translate([0,0,-52]) upper_long_tube(); }
    }
} else if(VIEW=="nut_motion_obstruction") {
    intersection() {
        guard_v1_6_x();
        hull() { vertical_joint_screw(); translate([0,0,-52]) vertical_joint_screw(); }
    }
} else if(VIEW=="rigid_lower_motion_obstruction") {
    intersection() {
        difference() { guard_v1_6_x(); allowed_hooks(); }
        hull() { lower_cross_tube(); translate([0,0,-52]) lower_cross_tube(); }
    }
} else if(VIEW=="original_material_removed") {
    difference() { guard_v1_5(); guard_v1_6_x(); }
} else if(VIEW=="triangles_changed") {
    difference() { all_four_triangular_fills(); guard_v1_6_x(); }
} else if(VIEW=="hooks_changed") {
    intersection() {
        union() {
            difference() { guard_v1_5(); guard_v1_6_x(); }
            difference() { guard_v1_6_x(); guard_v1_5(); }
        }
        allowed_hooks();
    }
} else if(VIEW=="x_mirror_difference") {
    union() {
        difference() { guard_v1_6_x(); mirror([1,0,0]) guard_v1_6_x(); }
        difference() { mirror([1,0,0]) guard_v1_6_x(); guard_v1_6_x(); }
    }
}
